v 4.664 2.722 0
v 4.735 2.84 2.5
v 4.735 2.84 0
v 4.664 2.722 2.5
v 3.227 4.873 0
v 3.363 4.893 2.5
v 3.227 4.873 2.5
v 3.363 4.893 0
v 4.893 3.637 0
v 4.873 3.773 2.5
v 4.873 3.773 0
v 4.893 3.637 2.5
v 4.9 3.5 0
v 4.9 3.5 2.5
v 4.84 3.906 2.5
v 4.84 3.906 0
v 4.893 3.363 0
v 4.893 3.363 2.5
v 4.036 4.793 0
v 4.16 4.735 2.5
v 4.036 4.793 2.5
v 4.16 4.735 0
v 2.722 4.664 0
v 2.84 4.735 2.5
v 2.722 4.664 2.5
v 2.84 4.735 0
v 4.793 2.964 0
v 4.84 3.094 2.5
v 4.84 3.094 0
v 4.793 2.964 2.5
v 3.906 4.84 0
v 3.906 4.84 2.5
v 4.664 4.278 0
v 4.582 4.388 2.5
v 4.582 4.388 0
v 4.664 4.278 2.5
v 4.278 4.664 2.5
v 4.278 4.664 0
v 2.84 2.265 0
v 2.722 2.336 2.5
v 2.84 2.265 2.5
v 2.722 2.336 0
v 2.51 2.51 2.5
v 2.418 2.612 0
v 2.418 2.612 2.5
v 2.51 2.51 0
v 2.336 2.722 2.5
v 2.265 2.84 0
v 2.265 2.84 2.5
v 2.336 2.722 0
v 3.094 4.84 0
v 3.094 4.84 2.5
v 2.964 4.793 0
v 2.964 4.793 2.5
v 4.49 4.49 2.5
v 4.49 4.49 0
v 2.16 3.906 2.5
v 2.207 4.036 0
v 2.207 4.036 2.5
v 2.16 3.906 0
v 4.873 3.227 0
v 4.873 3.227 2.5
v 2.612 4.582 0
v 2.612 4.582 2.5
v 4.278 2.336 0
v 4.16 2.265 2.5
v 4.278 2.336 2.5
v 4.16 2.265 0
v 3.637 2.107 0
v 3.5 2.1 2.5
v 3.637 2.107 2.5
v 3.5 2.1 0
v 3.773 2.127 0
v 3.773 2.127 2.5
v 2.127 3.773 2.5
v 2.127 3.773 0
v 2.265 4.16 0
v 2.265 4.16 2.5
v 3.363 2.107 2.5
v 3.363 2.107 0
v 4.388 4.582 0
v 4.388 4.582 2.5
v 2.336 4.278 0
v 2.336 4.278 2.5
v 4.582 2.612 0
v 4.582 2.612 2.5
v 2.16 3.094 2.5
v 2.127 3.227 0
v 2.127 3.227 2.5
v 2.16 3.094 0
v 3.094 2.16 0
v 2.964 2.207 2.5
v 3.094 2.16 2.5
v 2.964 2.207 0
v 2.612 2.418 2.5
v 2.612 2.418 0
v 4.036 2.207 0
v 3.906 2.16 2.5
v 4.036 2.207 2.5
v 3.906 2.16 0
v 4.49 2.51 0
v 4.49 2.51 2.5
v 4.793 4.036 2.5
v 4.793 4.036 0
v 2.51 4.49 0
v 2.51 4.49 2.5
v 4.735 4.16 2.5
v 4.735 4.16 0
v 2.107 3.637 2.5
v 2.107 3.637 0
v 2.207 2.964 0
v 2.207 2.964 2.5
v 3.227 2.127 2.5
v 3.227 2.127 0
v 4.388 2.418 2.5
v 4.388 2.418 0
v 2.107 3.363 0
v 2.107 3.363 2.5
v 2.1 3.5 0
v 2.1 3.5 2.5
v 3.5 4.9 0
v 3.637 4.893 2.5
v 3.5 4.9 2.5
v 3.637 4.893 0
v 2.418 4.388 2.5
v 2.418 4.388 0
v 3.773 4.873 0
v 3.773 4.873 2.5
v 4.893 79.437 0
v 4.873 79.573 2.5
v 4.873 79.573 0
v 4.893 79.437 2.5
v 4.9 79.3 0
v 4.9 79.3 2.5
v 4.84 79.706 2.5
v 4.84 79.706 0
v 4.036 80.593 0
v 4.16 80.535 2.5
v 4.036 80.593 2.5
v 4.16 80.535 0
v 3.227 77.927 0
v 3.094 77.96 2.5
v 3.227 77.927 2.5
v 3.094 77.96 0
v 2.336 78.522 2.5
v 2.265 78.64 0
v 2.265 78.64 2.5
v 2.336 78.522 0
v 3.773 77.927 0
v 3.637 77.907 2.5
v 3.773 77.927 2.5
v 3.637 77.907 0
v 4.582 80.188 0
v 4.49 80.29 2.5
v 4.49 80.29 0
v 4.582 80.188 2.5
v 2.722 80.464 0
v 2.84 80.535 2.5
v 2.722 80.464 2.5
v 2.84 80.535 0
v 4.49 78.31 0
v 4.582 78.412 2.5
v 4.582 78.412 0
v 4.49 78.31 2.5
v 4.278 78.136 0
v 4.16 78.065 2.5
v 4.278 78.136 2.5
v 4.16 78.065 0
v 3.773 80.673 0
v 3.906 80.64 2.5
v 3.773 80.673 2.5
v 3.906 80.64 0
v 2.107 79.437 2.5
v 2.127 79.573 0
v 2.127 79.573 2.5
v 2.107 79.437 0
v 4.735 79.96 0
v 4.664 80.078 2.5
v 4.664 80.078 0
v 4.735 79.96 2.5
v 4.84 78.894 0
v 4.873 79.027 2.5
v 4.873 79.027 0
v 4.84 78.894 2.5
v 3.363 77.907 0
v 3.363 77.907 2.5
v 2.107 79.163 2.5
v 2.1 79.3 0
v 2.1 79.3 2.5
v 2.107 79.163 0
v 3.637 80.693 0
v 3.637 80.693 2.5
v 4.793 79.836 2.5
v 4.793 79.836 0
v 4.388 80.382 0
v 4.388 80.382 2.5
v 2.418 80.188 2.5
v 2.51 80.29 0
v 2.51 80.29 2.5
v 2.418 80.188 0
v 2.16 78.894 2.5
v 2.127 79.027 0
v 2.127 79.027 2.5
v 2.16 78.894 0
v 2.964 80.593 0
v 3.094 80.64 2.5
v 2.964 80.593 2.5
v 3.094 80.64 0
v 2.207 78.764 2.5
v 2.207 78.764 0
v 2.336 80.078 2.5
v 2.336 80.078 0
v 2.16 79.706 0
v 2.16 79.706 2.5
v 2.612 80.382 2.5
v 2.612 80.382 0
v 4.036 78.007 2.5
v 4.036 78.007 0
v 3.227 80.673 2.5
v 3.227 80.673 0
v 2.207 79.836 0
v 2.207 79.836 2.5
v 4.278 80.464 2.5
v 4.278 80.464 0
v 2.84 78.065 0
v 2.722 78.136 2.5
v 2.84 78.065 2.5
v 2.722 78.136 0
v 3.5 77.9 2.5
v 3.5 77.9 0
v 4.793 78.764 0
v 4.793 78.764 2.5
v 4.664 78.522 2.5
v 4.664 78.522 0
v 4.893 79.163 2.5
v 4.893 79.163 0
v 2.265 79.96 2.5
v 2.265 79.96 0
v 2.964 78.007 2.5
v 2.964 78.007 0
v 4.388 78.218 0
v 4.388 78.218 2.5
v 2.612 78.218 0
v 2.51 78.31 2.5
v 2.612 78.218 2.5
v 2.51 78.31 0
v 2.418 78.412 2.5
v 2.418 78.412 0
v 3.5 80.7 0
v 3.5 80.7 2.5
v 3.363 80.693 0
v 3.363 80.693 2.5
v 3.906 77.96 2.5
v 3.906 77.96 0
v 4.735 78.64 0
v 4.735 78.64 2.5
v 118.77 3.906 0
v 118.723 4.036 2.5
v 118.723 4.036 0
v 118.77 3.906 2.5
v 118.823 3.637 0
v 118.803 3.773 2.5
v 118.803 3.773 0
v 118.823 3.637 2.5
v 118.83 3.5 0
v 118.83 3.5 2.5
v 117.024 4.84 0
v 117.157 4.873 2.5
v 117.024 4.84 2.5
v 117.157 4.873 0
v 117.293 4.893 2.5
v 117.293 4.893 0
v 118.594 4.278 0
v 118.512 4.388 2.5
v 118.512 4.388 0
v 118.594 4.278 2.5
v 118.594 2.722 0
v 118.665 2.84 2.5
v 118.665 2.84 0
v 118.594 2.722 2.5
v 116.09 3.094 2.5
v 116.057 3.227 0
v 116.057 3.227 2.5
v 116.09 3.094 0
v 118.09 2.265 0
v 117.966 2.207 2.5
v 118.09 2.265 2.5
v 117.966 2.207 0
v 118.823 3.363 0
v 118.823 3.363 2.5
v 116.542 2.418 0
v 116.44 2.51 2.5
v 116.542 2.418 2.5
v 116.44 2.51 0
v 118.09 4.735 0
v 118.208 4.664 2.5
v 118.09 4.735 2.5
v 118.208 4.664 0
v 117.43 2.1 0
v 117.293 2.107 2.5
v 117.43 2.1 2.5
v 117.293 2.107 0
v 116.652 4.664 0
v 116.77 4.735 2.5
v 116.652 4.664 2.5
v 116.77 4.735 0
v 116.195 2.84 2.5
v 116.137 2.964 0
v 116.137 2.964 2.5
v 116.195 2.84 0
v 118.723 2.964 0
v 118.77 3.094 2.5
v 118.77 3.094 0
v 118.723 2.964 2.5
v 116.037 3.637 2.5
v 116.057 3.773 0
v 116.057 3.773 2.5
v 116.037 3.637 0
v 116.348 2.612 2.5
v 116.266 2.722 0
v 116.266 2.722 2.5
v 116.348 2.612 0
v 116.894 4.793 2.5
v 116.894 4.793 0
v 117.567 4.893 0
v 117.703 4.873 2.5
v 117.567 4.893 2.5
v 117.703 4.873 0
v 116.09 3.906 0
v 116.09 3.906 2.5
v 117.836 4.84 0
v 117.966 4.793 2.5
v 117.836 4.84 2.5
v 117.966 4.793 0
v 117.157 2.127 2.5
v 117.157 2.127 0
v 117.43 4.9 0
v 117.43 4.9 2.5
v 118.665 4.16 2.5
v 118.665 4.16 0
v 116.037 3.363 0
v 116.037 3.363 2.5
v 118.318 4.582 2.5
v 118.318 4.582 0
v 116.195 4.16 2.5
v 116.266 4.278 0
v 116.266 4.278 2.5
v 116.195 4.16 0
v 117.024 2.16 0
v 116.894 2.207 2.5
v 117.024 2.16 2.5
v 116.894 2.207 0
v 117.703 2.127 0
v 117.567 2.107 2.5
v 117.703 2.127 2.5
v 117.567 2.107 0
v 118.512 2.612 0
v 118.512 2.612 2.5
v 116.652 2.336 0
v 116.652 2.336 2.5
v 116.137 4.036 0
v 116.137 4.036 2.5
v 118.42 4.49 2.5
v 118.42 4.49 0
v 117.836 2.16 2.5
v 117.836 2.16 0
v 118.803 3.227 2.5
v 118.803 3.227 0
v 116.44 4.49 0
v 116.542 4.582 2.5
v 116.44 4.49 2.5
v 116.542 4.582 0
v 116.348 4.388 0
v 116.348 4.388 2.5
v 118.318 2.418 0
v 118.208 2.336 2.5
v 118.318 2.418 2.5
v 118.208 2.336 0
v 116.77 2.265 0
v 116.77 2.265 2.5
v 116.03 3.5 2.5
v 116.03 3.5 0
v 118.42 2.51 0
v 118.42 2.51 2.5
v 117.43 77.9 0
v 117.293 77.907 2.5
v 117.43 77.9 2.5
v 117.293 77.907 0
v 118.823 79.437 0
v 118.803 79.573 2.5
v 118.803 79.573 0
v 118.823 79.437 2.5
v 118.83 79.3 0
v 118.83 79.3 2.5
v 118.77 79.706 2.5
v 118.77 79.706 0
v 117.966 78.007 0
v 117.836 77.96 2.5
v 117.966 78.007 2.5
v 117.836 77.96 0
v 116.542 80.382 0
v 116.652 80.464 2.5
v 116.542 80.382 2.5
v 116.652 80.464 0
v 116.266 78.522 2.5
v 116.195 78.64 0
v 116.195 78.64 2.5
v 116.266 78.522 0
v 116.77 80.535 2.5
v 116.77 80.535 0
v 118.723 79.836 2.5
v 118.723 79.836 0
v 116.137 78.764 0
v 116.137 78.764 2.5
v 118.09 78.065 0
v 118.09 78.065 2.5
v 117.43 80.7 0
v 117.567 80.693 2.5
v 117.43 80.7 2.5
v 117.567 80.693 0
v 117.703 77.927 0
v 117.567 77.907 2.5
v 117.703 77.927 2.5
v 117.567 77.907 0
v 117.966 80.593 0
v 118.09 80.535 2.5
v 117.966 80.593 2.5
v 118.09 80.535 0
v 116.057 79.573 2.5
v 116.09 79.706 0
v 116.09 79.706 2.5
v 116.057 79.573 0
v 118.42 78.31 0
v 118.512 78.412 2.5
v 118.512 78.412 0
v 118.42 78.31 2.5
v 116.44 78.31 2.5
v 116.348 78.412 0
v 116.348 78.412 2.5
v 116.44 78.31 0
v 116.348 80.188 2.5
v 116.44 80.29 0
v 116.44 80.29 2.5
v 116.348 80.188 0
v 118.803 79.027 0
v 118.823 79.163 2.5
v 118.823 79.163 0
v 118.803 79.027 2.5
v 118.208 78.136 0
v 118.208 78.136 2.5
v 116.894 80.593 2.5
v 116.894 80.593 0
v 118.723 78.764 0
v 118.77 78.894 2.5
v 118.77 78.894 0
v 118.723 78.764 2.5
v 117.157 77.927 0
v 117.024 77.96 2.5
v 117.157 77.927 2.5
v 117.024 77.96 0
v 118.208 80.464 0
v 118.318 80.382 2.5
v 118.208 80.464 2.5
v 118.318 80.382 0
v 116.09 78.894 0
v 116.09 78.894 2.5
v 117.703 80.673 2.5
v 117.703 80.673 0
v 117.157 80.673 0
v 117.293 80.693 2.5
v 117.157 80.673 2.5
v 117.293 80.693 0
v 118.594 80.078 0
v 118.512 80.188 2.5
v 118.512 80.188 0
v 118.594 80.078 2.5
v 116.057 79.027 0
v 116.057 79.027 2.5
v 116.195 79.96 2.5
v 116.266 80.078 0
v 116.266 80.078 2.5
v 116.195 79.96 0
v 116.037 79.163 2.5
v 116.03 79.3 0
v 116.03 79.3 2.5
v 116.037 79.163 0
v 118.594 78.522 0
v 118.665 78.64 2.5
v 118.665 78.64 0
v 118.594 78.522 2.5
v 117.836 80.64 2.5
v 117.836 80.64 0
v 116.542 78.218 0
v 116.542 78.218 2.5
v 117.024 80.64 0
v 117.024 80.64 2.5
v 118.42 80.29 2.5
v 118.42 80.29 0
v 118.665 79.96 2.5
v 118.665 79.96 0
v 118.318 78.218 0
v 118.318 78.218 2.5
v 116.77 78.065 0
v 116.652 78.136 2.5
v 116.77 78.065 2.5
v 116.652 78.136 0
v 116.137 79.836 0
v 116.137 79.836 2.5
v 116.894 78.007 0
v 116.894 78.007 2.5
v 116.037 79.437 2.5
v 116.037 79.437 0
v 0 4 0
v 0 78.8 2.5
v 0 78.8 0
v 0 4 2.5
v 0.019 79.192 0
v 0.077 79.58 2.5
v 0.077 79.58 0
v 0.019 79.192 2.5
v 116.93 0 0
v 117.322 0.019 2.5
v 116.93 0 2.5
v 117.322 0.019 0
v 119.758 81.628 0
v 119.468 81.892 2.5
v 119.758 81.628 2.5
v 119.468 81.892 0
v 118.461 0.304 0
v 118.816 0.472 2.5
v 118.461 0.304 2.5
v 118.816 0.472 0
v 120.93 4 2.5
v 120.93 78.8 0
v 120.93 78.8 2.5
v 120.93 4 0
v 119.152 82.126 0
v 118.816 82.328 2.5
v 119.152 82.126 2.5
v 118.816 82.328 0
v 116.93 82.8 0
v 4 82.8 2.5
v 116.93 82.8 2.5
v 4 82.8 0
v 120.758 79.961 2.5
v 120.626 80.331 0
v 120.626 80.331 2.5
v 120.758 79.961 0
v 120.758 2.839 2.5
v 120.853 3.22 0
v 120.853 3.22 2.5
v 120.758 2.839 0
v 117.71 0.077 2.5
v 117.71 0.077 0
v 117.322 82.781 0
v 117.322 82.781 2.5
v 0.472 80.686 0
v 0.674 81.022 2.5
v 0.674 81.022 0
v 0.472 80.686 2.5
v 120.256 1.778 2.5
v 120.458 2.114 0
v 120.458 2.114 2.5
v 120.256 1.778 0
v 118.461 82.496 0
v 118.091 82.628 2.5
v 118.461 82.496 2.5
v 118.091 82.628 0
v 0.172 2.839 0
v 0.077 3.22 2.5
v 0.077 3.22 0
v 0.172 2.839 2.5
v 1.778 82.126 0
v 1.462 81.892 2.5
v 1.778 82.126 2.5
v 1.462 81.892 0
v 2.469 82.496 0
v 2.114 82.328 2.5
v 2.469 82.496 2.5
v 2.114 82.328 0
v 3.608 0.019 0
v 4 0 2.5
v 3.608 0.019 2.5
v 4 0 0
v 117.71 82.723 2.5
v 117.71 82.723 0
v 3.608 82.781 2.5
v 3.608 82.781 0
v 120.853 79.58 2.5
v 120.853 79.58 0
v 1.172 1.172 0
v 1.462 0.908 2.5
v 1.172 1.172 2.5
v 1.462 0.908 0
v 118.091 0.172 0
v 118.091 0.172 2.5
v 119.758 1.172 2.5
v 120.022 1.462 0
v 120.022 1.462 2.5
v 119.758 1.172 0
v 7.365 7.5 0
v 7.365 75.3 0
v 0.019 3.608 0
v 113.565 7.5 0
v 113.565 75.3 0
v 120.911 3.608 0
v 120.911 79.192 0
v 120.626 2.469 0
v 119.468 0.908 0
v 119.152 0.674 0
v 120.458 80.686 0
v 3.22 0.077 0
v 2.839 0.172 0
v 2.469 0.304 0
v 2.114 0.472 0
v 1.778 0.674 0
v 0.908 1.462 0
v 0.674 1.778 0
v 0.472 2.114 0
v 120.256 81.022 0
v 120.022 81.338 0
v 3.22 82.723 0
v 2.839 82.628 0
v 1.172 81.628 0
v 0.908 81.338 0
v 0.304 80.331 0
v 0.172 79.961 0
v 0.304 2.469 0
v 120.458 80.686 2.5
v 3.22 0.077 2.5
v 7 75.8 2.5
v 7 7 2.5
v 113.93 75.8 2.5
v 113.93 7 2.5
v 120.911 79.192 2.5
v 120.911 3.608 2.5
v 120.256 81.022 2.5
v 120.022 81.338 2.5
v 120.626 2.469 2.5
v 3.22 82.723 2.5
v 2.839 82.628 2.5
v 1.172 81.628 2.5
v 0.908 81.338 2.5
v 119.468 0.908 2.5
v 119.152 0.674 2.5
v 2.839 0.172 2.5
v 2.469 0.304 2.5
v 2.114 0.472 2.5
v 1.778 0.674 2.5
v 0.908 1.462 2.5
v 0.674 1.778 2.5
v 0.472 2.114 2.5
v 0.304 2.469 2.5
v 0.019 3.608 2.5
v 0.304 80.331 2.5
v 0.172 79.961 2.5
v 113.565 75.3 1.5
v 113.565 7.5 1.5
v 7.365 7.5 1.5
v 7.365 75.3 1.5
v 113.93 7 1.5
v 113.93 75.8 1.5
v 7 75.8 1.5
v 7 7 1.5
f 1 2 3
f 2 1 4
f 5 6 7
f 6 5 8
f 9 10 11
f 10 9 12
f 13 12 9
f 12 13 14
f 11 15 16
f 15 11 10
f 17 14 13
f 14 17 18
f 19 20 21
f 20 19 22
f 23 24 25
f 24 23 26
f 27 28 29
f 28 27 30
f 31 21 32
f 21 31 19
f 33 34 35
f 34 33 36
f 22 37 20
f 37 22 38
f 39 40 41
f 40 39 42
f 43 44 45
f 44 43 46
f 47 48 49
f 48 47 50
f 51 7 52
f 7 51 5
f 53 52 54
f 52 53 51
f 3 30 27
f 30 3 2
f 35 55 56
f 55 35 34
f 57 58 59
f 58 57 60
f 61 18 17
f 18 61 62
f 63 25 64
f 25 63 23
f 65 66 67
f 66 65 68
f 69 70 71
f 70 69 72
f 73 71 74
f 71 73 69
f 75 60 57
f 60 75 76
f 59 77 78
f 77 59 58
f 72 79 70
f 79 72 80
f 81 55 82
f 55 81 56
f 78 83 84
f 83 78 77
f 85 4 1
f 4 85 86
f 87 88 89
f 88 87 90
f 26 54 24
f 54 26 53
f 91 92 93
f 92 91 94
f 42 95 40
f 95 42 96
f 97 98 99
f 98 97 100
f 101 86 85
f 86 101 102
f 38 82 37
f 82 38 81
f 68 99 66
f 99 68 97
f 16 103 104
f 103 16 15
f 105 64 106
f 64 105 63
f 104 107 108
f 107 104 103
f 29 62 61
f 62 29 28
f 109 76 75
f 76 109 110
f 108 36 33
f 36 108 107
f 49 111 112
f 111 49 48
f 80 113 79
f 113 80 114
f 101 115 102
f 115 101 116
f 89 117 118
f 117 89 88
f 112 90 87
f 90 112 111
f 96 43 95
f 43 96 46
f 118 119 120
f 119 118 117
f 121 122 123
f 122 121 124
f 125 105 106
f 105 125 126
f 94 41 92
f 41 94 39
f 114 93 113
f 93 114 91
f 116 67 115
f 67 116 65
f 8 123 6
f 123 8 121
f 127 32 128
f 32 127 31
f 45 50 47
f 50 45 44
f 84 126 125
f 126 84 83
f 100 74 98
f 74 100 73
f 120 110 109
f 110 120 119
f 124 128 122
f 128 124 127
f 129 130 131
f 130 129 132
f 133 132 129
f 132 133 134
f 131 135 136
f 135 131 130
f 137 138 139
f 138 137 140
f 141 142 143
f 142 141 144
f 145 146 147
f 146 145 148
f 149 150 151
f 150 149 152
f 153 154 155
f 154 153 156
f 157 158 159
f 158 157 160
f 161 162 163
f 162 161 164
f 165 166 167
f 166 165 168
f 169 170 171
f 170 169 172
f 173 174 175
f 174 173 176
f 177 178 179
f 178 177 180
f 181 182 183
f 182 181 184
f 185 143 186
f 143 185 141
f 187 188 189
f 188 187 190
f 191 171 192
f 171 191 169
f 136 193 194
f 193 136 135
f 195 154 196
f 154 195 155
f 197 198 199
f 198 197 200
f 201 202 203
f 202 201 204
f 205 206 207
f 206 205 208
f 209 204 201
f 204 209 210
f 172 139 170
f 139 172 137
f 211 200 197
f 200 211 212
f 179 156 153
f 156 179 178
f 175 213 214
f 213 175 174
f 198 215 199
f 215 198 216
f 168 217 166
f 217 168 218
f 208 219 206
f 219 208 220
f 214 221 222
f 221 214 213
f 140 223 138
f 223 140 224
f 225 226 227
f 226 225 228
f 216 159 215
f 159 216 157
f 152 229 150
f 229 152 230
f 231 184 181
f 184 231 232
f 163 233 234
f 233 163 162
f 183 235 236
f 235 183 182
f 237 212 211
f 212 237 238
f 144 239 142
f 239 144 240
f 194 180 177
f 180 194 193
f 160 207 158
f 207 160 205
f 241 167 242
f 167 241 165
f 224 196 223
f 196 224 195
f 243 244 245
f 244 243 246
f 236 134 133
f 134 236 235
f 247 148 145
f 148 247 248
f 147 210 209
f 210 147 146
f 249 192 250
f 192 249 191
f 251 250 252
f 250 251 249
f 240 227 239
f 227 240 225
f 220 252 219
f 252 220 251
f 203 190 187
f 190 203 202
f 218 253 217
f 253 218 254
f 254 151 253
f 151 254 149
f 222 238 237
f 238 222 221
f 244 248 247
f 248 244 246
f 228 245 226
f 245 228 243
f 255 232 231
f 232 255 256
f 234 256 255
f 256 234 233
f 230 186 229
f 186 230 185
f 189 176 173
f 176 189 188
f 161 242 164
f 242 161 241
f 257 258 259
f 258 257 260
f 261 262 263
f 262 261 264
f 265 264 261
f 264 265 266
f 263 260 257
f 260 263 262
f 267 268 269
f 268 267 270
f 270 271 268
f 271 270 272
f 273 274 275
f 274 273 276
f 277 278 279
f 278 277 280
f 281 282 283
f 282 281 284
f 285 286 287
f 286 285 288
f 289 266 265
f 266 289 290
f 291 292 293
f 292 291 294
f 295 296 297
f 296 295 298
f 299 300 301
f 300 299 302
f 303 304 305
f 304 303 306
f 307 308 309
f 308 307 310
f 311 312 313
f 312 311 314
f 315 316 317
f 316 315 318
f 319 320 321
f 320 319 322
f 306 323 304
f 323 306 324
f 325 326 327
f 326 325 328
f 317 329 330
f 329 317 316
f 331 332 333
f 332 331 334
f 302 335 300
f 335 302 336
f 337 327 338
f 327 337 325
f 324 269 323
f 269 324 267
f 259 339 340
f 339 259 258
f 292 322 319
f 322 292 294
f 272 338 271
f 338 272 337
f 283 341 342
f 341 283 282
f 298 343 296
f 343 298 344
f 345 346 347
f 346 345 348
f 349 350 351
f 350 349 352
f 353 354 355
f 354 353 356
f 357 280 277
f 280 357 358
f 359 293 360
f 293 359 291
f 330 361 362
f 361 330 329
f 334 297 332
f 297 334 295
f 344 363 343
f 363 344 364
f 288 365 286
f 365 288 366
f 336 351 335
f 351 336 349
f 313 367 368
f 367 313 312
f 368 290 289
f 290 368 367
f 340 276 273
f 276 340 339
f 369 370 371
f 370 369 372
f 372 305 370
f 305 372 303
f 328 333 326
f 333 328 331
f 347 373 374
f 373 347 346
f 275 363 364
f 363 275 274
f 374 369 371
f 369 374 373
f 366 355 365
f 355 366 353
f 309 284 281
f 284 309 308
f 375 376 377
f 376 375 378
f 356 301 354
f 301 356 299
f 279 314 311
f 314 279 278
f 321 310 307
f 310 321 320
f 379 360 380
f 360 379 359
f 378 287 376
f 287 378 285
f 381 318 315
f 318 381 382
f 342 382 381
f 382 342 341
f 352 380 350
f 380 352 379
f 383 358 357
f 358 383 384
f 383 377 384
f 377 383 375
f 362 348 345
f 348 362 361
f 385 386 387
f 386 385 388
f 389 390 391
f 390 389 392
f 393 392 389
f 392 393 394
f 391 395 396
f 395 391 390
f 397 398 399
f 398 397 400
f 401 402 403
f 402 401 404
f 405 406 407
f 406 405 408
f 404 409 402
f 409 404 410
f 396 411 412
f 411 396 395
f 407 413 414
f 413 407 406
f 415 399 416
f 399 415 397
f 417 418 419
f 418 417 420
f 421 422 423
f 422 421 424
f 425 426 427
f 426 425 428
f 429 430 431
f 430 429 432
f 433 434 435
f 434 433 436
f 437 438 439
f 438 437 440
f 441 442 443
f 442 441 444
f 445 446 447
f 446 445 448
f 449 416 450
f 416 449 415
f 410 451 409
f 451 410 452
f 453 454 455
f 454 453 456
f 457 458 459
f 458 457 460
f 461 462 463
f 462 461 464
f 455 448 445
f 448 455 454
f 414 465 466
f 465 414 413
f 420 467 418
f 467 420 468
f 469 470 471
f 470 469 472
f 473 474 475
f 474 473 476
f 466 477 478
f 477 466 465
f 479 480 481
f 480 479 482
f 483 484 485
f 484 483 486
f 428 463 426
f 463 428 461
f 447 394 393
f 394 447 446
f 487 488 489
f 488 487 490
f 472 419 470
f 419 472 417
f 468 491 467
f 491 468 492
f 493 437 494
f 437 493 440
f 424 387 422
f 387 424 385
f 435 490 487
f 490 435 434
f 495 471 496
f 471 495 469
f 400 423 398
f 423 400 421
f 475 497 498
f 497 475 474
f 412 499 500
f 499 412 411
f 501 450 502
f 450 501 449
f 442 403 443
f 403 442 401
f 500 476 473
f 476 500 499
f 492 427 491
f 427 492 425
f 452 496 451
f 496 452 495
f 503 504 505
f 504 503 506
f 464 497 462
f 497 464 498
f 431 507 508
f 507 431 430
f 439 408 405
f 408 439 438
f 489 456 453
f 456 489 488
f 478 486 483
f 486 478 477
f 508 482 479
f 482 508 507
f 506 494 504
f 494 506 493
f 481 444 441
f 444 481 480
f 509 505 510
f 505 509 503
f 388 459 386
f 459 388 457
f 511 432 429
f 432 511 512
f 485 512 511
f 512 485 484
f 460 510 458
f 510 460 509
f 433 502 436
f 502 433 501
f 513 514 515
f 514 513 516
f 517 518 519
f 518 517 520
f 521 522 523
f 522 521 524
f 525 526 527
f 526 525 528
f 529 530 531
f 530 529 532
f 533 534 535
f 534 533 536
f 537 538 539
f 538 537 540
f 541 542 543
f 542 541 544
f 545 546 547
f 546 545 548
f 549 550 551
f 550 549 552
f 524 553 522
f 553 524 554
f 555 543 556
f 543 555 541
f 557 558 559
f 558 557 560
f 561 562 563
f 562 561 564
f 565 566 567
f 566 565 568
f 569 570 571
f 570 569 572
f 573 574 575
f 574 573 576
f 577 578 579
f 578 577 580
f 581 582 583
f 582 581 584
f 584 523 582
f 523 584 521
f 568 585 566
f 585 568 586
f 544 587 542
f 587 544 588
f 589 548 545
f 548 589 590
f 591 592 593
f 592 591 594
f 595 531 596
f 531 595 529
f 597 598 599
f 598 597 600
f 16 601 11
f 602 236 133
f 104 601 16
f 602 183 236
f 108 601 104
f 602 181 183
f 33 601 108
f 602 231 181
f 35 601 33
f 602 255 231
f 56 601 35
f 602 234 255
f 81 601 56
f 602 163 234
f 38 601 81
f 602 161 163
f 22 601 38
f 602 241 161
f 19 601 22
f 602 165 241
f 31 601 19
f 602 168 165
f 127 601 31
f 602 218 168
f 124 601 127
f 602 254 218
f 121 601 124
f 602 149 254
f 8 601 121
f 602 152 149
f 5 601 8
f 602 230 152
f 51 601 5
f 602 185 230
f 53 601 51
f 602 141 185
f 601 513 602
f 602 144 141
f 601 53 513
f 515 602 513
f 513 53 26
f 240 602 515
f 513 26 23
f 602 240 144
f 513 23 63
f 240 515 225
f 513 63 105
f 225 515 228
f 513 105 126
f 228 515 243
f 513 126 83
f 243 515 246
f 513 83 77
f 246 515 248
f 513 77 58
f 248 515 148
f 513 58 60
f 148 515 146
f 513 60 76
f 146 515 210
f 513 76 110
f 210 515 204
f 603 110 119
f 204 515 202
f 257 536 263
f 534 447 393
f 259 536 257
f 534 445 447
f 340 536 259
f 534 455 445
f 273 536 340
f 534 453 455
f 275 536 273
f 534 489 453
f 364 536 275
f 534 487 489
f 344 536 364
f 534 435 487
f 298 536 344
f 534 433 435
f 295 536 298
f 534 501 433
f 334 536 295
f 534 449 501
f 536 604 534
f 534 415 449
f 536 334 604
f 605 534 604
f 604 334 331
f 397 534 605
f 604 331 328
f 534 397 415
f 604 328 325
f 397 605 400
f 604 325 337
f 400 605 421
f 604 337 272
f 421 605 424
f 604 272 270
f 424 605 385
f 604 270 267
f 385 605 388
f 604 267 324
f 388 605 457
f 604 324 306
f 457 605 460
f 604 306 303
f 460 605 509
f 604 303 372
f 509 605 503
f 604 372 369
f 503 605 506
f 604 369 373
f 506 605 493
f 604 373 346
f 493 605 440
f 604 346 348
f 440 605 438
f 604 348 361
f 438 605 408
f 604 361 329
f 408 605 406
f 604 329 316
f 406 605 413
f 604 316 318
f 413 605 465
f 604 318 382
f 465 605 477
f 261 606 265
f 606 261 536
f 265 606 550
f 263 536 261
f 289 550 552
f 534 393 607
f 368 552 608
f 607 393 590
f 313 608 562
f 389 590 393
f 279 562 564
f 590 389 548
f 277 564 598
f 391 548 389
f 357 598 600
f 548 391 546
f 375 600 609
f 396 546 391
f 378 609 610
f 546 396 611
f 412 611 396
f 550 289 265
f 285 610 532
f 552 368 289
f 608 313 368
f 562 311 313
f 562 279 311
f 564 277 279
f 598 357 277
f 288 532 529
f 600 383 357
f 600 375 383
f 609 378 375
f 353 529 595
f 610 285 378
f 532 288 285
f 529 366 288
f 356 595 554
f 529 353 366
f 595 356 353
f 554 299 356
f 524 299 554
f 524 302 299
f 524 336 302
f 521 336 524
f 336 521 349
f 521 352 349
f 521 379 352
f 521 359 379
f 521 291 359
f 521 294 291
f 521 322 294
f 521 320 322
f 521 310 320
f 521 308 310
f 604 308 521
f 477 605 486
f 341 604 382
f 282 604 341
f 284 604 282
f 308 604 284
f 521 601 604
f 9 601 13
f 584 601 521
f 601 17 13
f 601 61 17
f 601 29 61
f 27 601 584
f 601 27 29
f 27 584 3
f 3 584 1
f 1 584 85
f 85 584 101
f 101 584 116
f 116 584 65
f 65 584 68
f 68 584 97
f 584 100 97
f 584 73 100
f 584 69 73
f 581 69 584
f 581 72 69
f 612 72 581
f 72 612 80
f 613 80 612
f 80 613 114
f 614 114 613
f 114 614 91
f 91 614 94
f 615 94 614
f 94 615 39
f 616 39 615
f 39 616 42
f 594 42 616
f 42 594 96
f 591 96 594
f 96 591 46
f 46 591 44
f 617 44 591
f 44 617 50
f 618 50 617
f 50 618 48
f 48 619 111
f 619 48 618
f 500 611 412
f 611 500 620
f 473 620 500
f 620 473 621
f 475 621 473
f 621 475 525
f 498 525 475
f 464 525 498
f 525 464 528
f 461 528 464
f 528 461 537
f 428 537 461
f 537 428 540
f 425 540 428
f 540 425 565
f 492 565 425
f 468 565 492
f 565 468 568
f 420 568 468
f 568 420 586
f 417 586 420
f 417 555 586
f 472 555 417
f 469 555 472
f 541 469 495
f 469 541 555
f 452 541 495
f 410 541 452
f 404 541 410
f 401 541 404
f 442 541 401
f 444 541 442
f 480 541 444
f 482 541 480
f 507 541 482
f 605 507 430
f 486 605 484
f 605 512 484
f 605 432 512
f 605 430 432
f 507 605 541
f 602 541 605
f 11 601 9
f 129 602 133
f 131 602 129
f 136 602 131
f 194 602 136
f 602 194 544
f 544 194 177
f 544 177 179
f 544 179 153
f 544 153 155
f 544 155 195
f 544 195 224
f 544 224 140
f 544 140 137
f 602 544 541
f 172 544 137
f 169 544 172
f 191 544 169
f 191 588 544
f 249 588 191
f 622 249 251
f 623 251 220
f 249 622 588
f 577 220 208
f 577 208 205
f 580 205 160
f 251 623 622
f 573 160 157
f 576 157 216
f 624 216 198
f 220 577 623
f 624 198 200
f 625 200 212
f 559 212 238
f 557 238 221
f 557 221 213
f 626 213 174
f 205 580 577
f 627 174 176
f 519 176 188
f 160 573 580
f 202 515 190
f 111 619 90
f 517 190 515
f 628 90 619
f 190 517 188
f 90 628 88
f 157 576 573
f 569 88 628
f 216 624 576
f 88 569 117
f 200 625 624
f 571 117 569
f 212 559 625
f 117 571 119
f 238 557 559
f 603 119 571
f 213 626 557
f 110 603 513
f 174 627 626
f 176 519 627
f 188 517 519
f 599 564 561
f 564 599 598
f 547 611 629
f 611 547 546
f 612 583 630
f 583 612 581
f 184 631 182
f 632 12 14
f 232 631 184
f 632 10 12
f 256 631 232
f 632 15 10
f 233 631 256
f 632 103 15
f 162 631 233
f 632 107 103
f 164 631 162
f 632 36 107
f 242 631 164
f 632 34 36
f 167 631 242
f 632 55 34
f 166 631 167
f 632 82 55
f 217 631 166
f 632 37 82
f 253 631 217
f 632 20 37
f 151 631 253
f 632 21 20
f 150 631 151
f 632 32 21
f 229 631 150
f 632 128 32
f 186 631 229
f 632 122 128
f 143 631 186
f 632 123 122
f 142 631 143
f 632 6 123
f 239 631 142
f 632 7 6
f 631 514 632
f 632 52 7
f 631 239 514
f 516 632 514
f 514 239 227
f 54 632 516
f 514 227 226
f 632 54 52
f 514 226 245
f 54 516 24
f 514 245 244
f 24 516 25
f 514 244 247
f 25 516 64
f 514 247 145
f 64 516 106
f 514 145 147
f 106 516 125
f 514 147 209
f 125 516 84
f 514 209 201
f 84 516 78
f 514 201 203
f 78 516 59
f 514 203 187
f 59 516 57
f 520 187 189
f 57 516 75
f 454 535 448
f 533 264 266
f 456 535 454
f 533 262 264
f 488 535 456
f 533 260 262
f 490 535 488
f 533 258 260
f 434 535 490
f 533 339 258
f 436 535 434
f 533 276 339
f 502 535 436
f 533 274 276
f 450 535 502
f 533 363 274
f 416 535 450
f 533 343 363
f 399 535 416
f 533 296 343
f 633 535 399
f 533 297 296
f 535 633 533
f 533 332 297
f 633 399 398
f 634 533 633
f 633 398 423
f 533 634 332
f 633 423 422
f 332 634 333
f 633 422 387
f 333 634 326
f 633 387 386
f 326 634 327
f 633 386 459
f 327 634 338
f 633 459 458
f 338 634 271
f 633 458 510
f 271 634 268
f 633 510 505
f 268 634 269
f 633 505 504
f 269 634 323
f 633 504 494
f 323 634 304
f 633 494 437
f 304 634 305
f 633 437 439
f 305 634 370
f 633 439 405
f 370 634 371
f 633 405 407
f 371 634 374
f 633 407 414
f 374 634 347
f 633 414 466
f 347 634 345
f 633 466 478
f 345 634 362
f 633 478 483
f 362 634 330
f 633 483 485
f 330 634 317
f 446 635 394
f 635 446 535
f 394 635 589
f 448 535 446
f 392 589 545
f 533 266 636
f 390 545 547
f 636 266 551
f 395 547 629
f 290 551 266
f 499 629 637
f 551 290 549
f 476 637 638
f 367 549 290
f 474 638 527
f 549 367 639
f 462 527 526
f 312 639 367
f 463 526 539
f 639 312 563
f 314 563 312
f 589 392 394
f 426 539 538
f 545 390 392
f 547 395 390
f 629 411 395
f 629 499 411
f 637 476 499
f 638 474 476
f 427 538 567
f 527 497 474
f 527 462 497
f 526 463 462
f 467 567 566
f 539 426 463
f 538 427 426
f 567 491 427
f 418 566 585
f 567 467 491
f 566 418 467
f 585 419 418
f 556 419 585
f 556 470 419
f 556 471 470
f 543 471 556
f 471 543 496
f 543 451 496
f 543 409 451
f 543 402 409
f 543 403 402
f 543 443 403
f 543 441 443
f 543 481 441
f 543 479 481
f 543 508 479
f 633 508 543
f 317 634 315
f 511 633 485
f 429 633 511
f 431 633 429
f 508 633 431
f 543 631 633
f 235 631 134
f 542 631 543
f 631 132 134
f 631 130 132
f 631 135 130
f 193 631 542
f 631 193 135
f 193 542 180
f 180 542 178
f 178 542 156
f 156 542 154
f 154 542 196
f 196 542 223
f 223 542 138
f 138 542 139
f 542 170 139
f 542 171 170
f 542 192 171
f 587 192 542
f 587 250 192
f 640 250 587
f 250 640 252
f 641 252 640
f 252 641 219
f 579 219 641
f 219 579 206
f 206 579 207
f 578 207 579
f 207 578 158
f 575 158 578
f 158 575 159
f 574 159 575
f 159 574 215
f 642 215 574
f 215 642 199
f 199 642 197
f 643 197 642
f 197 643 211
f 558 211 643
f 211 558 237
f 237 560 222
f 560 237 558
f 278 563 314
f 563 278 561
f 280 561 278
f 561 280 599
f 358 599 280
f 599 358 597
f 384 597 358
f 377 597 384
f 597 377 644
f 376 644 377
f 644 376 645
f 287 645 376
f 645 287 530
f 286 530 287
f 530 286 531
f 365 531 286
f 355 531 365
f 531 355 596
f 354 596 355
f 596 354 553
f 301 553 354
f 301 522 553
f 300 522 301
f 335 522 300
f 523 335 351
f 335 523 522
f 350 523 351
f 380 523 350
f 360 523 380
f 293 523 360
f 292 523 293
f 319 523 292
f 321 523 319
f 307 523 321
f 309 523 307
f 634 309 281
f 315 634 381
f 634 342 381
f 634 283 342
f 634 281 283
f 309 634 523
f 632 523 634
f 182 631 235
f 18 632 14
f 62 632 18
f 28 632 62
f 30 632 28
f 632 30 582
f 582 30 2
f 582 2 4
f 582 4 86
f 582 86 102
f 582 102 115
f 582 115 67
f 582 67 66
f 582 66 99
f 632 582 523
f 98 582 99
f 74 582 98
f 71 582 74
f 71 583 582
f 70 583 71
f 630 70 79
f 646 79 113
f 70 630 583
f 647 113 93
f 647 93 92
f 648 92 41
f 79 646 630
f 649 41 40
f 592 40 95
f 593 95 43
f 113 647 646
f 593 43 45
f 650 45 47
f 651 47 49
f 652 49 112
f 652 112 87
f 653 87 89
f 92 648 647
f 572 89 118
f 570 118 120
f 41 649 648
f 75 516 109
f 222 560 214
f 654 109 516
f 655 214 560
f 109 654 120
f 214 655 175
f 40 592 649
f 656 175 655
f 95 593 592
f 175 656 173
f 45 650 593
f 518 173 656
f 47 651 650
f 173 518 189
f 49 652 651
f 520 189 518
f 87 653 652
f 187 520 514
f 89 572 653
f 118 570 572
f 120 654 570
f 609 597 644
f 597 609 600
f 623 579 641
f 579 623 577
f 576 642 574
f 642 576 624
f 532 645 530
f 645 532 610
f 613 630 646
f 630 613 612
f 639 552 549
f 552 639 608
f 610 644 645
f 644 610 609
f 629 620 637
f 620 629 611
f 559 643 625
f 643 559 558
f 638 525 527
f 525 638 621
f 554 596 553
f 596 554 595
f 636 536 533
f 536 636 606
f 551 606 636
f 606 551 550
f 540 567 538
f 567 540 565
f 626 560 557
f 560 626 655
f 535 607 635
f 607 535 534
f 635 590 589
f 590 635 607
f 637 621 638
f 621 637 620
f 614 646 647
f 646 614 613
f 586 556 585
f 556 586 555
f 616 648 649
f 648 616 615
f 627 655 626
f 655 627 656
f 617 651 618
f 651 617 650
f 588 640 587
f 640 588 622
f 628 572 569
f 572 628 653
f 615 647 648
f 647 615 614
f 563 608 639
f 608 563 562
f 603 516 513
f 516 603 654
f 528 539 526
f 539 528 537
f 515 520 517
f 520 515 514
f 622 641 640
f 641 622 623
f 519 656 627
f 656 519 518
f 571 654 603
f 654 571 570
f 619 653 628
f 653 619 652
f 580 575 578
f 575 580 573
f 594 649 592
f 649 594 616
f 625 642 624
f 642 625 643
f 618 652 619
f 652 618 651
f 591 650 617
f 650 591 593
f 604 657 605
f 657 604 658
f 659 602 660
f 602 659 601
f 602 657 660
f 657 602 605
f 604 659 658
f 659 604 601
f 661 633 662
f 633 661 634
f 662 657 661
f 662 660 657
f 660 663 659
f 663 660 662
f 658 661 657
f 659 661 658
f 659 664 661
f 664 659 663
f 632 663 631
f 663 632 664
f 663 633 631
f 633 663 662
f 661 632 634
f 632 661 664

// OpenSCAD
/* =========================================================
   Waveshare 4.3" Display Flat-Frame Bezel
   For Meijia Portable Case  (295.9 x 212.1mm lid)

   Display PCB:    106.33 x 68.2 x 8.6mm
   Glass measured: 106.2  x 67.8mm (full glass incl. black frame)
   Active area:    ~95    x 54mm   (inside black frame — window opening)

   Why flat frame (not a deep channel):
     Lid interior depth ≈ 9-10mm  (12.52mm rim - ~3mm panel)
     Display depth     =  8.6mm  → barely fits, no room for a channel
     Solution: frame sits on lid EXTERIOR, display drops straight
     through a cut hole into the lid interior — glass presses
     against the frame back surface from inside.

   Install order:
     1. Print bezel() face-down, lid_template() flat
     2. Lay lid_template on lid exterior, trace & cut hole
     3. M3 screws or 2mm bead of silicone fix frame to lid exterior
     4. From inside, push display glass against frame window
     5. Run a bead of silicone around PCB edges from inside
     6. Optional: print back_retainer() and screw in for positive lock

   Print settings:
     Orientation : face DOWN (flat on bed — cleanest window edges)
     Layer height : 0.15 mm
     Infill       : 40%
     Supports     : none needed
   ========================================================= */


// ── ADJUST THESE ──────────────────────────────────────────

// Screen window opening = full glass (including black border frame)
// Measured from display face
screen_l = 106.2;   // mm  (full glass, long axis)
screen_w =  67.8;   // mm  (full glass, short axis)

// Fit tolerance on each side of PCB channel (back pocket + lid hole)
// 0.25 = snug | 0.4 = loose
clearance = 0.30;   // mm per side

// Frame thickness (how far screen glass sits below lid surface)
// Thicker = stronger frame, deeper recess. 2.5mm is a good balance.
face_t    = 2.5;    // mm

// Frame border width around the PCB pocket
border    = 7.0;    // mm each side

// Rounded corners
corner_r  = 4.0;    // mm

// Screw holes (M3 pilot, screws come from inside case through lid)
screw_d   = 2.8;    // mm  (2.8 for M3 pilot / heat-insert OD)


// ── FIXED — from datasheet / measurement ─────────────────

pcb_l = 106.33;
pcb_w =  68.20;
pcb_t =   8.60;    // used for back_retainer standoff reference only


// ── DERIVED ───────────────────────────────────────────────

chan_l  = pcb_l + 2 * clearance;   // lid hole to cut = this
chan_w  = pcb_w + 2 * clearance;
outer_l = chan_l + 2 * border;
outer_w = chan_w + 2 * border;

// Back pocket depth: shallow register that centers display on frame
pocket_d = 1.0;    // mm — just enough to locate the PCB

$fn = 64;

echo("─── Bezel dimensions ────────────────────────────────");
echo(str("  Frame (L x W x thick):    ", outer_l, " x ", outer_w, " x ", face_t, " mm"));
echo(str("  CUT LID HOLE (L x W):     ", chan_l,  " x ", chan_w,  " mm"));
echo(str("  Screen window (L x W):    ", screen_l, " x ", screen_w, " mm"));
echo(str("  Border around window:     ", (outer_l-screen_l)/2, " mm each side"));
echo("─────────────────────────────────────────────────────");


// ─────────────────────────────────────────────────────────
// Helper
// ─────────────────────────────────────────────────────────

module rounded_box(l, w, h, r) {
    hull() {
        for (xi = [r, l - r])
        for (yi = [r, w - r])
            translate([xi, yi, 0])
                cylinder(r = r, h = h);
    }
}


// ─────────────────────────────────────────────────────────
// MAIN BEZEL  — print this face-down
// ─────────────────────────────────────────────────────────
//
//  Front (outside of case):
//  ┌─────────────────────────────────────────┐
//  │  ●                                  ●  │  ← corner screw holes
//  │     ┌─────────────────────────────┐     │
//  │     │   SCREEN WINDOW  (air)      │     │
//  │     └─────────────────────────────┘     │
//  │  ●                                  ●  │
//  └─────────────────────────────────────────┘
//  Back (inside of case / against lid):
//  ┌─────────────────────────────────────────┐
//  │     ┌───────────────────────────────┐   │  ← 1mm back pocket
//  │     │  LID HOLE + PCB fits here     │   │    (locates display)
//  │     └───────────────────────────────┘   │
//  └─────────────────────────────────────────┘
//  Display glass rests against the frame back surface
//  around the pocket opening. PCB drops through lid hole.

module bezel() {
    difference() {

        // ① Flat plate
        rounded_box(outer_l, outer_w, face_t, corner_r);

        // ② Screen window — centered, full depth
        translate([(outer_l - screen_l) / 2,
                   (outer_w - screen_w) / 2,
                   -0.1])
            cube([screen_l, screen_w, face_t + 0.2]);

        // ③ Back pocket — shallow recess, matches lid hole
        //   Display glass edge rests on the 1mm step around this opening
        translate([(outer_l - chan_l) / 2,
                   (outer_w - chan_w) / 2,
                   face_t - pocket_d])
            cube([chan_l, chan_w, pocket_d + 0.1]);

        // ④ Corner pilot holes (M3 screws from inside lid)
        si = border / 2;
        for (x = [si, outer_l - si])
        for (y = [si, outer_w - si])
            translate([x, y, -0.1])
                cylinder(d = screw_d, h = face_t + 0.2);
    }
}


// ─────────────────────────────────────────────────────────
// LID CUTTING TEMPLATE  — print flat, place on lid, trace
// Outer outline = frame footprint
// Inner cutout  = the hole to cut through the lid
// ─────────────────────────────────────────────────────────

module lid_template() {
    template_t = 1.2;    // thin — just for tracing
    wall       = 2.0;    // keep inner + outer reference

    translate([0, -(outer_w + 12), 0])
    difference() {
        // Outer reference (same footprint as bezel frame)
        rounded_box(outer_l, outer_w, template_t, corner_r);

        // Inner cutout = lid hole
        translate([(outer_l - chan_l) / 2,
                   (outer_w - chan_w) / 2,
                   -0.1])
            cube([chan_l, chan_w, template_t + 0.2]);
    }
}


// ─────────────────────────────────────────────────────────
// BACK RETAINER  — optional, print separately
// Locks display from inside. Screws through lid into bezel
// pilot holes. Add M3 x 10mm screws + 3.5mm spacers/washers
// to span the lid thickness.
// ─────────────────────────────────────────────────────────

module back_retainer() {
    ret_t = 2.0;

    translate([outer_l + 12, 0, 0])
    difference() {
        rounded_box(outer_l, outer_w, ret_t, corner_r);

        // Central window — clears display body, retains by edges only
        // Make it 4mm smaller each side than the PCB
        inset = 4.0;
        translate([(outer_l - chan_l + inset) / 2,
                   (outer_w - chan_w + inset) / 2,
                   -0.1])
            cube([chan_l - inset, chan_w - inset, ret_t + 0.2]);

        // Corner holes matching bezel pilot holes
        si = border / 2;
        for (x = [si, outer_l - si])
        for (y = [si, outer_w - si])
            translate([x, y, -0.1])
                cylinder(d = screw_d, h = ret_t + 0.2);
    }
}


// ─────────────────────────────────────────────────────────
// Render — comment/uncomment as needed
// ─────────────────────────────────────────────────────────

bezel();
// lid_template();    // uncomment to also render cutting template
// back_retainer();   // uncomment to also render back retainer
